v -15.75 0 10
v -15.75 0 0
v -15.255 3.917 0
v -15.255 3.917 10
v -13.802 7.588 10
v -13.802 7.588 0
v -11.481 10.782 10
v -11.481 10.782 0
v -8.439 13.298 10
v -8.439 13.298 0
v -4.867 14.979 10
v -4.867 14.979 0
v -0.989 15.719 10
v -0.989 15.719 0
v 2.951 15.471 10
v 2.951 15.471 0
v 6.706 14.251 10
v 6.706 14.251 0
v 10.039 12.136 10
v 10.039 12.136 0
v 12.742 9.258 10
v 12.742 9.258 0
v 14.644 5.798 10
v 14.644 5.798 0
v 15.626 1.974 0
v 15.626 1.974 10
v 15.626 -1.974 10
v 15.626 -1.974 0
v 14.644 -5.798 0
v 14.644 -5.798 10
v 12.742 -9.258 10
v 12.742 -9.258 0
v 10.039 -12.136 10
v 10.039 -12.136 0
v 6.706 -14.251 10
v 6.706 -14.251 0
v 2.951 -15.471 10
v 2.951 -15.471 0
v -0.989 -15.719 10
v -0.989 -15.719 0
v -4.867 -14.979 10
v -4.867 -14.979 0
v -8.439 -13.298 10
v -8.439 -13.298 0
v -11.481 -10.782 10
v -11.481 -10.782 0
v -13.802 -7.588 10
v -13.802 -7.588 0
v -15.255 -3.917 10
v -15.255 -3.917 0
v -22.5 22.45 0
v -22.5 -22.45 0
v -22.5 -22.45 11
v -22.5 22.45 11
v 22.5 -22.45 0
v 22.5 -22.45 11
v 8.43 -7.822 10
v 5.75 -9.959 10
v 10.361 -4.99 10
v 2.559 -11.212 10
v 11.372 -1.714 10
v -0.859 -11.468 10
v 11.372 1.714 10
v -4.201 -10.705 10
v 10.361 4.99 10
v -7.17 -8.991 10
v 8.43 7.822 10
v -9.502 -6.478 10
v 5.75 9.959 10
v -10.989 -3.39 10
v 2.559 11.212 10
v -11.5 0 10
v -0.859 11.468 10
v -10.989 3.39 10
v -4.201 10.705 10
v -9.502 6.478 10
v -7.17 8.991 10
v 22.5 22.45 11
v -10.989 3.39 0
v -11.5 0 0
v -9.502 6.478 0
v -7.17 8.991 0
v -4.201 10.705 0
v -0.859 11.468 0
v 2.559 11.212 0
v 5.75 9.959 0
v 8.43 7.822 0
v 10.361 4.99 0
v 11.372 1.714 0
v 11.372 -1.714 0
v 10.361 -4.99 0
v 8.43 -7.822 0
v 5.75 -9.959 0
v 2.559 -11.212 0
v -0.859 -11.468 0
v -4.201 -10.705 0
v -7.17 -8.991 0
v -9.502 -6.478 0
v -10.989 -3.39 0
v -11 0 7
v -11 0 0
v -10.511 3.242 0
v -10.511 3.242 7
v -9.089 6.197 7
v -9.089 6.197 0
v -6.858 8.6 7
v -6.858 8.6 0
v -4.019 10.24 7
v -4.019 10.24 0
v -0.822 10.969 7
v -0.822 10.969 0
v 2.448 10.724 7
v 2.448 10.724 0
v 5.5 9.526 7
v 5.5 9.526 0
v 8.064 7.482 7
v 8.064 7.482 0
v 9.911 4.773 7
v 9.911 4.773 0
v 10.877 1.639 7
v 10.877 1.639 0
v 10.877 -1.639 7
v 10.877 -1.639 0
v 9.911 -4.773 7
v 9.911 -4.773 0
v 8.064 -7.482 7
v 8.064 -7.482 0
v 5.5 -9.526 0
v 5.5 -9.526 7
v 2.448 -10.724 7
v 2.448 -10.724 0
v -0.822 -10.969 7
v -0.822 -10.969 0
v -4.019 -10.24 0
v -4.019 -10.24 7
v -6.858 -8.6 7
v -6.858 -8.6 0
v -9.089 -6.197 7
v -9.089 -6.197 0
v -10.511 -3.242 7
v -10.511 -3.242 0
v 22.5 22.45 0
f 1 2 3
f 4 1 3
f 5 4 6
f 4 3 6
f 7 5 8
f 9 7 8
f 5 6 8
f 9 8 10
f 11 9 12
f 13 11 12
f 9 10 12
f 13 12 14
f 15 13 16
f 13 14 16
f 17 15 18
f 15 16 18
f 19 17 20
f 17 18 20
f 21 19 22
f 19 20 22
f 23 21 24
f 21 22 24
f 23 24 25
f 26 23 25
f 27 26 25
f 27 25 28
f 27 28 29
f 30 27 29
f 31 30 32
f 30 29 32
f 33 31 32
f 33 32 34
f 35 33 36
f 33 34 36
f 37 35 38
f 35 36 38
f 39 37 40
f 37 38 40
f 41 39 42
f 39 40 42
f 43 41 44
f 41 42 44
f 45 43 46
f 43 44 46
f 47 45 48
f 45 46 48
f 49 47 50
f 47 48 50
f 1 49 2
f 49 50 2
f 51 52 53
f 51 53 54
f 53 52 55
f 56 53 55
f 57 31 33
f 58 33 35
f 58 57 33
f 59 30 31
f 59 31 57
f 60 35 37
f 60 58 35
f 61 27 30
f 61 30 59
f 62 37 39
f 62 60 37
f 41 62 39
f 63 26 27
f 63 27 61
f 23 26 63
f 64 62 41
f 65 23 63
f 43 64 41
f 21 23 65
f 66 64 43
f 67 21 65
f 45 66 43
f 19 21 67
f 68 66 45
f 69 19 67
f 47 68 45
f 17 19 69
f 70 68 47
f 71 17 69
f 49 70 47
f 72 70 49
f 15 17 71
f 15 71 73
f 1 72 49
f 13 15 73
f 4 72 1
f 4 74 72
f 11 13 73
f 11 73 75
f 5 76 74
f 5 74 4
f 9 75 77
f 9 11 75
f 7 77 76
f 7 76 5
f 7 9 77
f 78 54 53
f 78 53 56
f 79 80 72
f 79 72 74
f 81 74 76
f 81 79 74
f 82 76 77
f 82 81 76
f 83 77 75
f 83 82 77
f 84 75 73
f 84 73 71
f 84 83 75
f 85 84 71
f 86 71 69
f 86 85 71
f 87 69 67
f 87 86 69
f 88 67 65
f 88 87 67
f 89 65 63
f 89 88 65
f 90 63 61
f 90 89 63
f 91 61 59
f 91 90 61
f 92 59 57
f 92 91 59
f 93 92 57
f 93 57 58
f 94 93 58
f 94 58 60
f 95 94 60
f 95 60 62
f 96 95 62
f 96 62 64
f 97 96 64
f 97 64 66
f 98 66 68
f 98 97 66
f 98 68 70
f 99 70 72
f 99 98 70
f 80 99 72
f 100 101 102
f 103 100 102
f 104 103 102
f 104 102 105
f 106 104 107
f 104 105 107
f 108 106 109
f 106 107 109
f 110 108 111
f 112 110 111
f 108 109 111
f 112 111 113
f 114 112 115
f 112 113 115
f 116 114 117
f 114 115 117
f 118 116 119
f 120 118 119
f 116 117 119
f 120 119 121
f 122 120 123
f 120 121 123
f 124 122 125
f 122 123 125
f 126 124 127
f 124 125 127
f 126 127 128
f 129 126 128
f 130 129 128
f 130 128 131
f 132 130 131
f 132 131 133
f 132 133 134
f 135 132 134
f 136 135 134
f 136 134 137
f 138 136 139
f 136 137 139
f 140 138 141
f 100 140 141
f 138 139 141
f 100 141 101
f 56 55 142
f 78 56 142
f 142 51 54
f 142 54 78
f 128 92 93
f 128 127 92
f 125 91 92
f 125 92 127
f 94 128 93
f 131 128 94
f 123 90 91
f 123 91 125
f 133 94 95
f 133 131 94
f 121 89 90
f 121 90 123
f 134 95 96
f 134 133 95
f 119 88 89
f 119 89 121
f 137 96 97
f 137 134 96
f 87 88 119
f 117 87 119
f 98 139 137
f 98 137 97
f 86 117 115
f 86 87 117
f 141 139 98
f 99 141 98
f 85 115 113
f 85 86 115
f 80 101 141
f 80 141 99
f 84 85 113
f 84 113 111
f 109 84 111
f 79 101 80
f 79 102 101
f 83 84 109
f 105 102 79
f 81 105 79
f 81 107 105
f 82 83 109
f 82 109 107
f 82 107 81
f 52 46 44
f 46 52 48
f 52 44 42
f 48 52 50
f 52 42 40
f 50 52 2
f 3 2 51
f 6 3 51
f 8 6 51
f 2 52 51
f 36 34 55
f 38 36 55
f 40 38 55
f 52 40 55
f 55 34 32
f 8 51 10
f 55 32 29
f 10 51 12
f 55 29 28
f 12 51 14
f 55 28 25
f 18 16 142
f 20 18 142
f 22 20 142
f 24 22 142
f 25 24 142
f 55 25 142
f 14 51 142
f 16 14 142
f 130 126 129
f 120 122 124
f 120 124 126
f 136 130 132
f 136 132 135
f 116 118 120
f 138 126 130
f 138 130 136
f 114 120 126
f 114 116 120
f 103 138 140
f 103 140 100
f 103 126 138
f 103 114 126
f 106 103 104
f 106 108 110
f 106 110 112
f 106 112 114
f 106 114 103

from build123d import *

# Parameters (mm, degrees)
SKIZZE1_W                       = 45
SKIZZE1_H                       = 44.9
AUFSATZ_LINEAR_AUSTRAGEN1_DEPTH = 11
SKIZZE3_R                       = 15.75
SCHNITT_LINEAR_AUSTRAGEN1_DEPTH = 10
SKIZZE7_R                       = 11.5
AUFSATZ_LINEAR_AUSTRAGEN3_DEPTH = 10
SKIZZE8_R                       = 11
SCHNITT_LINEAR_AUSTRAGEN4_DEPTH = 7


with BuildPart() as part:
    # Skizze1 → Aufsatz-Linear austragen1 (new body)
    with BuildSketch(Plane.XY):
        Rectangle(SKIZZE1_W, SKIZZE1_H)
    extrude(amount=AUFSATZ_LINEAR_AUSTRAGEN1_DEPTH)

    # Skizze3 → Schnitt-Linear austragen1 (cut)
    with BuildSketch(Plane(origin=(0, 0, 0), x_dir=(-1, 0, 0), z_dir=(0, 0, -1))):
        Circle(SKIZZE3_R)
    extrude(amount=-SCHNITT_LINEAR_AUSTRAGEN1_DEPTH, mode=Mode.SUBTRACT)

    # Skizze7 → Aufsatz-Linear austragen3 (add)
    with BuildSketch(Plane(origin=(0, 0, 0), x_dir=(-1, 0, 0), z_dir=(0, 0, -1))):
        Circle(SKIZZE7_R)
    extrude(amount=-AUFSATZ_LINEAR_AUSTRAGEN3_DEPTH)

    # Skizze8 → Schnitt-Linear austragen4 (cut)
    with BuildSketch(Plane(origin=(0, 0, 0), x_dir=(-1, 0, 0), z_dir=(0, 0, -1))):
        Circle(SKIZZE8_R)
    extrude(amount=-SCHNITT_LINEAR_AUSTRAGEN4_DEPTH, mode=Mode.SUBTRACT)


solid = part.part
